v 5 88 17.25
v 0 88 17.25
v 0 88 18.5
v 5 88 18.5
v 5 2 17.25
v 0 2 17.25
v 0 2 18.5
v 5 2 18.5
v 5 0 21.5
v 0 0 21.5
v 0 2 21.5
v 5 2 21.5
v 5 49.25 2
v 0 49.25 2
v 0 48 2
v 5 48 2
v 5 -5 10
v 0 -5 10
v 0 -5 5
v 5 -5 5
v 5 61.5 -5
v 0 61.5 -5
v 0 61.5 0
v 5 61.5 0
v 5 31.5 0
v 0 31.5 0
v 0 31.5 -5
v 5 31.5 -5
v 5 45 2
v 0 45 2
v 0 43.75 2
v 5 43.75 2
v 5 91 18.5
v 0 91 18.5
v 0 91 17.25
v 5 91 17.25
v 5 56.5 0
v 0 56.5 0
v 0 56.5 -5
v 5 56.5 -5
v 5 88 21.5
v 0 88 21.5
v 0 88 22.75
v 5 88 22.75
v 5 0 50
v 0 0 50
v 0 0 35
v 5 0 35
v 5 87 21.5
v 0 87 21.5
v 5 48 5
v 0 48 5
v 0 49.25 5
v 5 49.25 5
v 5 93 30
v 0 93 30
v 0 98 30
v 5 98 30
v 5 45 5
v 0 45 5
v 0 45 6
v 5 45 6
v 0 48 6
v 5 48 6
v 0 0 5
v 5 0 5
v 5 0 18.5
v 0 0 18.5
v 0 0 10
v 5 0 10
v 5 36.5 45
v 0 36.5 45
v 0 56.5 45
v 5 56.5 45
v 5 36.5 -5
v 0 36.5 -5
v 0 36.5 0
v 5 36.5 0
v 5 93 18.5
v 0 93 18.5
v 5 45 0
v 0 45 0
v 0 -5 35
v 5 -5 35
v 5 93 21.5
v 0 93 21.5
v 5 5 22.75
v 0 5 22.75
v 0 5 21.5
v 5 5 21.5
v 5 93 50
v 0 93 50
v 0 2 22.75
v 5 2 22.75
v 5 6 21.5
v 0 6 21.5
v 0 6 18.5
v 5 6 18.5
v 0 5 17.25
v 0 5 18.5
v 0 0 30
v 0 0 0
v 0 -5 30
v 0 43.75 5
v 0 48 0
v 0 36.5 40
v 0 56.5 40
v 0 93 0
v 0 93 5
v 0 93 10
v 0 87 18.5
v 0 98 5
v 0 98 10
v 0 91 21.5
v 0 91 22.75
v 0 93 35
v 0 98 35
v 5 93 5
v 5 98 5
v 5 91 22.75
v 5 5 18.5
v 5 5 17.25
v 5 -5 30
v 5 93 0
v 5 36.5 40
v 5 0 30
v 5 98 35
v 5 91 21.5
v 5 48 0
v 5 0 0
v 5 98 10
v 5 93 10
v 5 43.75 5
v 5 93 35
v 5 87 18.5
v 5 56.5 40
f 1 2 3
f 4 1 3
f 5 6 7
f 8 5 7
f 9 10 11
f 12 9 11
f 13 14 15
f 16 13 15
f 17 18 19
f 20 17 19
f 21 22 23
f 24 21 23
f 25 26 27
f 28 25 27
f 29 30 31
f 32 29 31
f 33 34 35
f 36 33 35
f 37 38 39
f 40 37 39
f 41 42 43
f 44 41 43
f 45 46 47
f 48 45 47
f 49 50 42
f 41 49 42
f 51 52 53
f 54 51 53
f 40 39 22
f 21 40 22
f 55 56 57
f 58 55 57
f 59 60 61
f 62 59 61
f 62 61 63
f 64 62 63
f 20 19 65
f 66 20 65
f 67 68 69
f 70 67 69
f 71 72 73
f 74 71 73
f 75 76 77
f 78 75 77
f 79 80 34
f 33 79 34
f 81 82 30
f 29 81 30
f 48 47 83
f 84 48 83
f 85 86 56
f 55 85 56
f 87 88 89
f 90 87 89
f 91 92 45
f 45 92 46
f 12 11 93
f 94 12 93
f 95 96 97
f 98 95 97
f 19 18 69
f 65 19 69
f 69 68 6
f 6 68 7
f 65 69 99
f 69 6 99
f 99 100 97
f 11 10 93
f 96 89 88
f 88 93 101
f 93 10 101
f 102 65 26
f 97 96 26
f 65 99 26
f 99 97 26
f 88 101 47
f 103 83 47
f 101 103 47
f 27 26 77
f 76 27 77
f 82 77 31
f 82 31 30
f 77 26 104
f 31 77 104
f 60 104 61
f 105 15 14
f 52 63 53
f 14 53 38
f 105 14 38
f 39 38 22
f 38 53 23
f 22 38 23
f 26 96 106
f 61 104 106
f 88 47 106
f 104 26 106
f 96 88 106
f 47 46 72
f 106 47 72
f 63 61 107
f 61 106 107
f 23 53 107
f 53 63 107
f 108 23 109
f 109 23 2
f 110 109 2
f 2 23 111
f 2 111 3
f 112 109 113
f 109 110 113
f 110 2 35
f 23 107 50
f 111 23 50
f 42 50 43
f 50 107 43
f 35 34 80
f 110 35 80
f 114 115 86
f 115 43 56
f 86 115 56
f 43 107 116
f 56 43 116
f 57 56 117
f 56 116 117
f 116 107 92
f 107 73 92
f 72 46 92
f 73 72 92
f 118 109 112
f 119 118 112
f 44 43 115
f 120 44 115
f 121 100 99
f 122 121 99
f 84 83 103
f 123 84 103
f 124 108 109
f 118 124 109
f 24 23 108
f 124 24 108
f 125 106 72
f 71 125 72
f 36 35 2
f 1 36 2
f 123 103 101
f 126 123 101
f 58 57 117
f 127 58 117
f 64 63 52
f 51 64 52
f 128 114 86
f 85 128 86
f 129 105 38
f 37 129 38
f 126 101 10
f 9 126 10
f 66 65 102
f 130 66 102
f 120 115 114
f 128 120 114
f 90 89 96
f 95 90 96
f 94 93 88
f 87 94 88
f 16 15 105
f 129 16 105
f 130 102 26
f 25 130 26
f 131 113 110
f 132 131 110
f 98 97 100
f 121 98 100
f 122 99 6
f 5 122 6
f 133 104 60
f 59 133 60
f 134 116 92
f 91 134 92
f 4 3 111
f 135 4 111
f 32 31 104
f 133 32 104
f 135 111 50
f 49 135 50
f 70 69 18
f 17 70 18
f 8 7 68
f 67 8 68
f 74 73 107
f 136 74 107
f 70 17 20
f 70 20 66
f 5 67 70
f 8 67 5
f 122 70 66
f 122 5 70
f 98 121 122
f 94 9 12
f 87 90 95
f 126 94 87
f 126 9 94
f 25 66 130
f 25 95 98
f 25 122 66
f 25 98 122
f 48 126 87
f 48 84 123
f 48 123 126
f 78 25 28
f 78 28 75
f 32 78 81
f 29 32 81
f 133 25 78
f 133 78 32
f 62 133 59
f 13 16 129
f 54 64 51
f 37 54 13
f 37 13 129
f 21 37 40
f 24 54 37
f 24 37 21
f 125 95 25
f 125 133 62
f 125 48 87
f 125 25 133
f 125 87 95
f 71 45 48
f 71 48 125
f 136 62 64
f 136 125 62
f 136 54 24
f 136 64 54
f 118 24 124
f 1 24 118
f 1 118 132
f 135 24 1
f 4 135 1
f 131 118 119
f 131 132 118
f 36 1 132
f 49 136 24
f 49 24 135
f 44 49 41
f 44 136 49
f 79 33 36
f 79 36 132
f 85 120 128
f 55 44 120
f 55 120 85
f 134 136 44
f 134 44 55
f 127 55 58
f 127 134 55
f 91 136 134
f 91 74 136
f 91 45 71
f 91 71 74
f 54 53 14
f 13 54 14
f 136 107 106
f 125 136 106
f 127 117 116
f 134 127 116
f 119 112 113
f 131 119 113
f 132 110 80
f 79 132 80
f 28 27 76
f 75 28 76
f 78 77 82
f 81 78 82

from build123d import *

# Parameters (mm, degrees)
F2_DEPTH = 5


with BuildPart() as f2:
    # F1 (on Right) → F2 (new body)
    with BuildSketch(Plane.YZ):
        Polygon((0, 5), (0, 0), (31.5, 0), (31.5, -5), (36.5, -5), (36.5, 0), (45, 0), (45, 2), (43.75, 2), (43.75, 5), (45, 5), (45, 6), (48, 6), (48, 5), (49.25, 5), (49.25, 2), (48, 2), (48, 0), (56.5, 0), (56.5, -5), (61.5, -5), (61.5000001655, 0), (93, 0), (93, 5), (98, 5), (98, 10), (93, 10), (93, 18.5), (91, 18.5), (91, 17.25), (88, 17.25), (88, 18.5), (87, 18.5), (87, 21.5), (88, 21.5), (88, 22.75), (91, 22.75), (91, 21.5), (93, 21.5), (93, 30), (98, 30), (98, 35), (93, 35), (93, 40), (93, 50), (0, 50), (0, 40), (0, 35), (-5, 35), (-5, 30), (0, 30), (0, 21.5), (2, 21.5), (2, 22.75), (5, 22.75), (5, 21.5), (6, 21.5), (6, 18.5), (5, 18.5), (5, 17.25), (2, 17.25), (2, 18.5), (0, 18.5), (0, 10), (-5, 10), (-5, 5), align=None)
        Polygon((36.5, 45), (56.5, 45), (56.5, 40), (45, 40), (36.5, 40), align=None, mode=Mode.SUBTRACT)
    extrude(amount=F2_DEPTH)


solid = f2.part
